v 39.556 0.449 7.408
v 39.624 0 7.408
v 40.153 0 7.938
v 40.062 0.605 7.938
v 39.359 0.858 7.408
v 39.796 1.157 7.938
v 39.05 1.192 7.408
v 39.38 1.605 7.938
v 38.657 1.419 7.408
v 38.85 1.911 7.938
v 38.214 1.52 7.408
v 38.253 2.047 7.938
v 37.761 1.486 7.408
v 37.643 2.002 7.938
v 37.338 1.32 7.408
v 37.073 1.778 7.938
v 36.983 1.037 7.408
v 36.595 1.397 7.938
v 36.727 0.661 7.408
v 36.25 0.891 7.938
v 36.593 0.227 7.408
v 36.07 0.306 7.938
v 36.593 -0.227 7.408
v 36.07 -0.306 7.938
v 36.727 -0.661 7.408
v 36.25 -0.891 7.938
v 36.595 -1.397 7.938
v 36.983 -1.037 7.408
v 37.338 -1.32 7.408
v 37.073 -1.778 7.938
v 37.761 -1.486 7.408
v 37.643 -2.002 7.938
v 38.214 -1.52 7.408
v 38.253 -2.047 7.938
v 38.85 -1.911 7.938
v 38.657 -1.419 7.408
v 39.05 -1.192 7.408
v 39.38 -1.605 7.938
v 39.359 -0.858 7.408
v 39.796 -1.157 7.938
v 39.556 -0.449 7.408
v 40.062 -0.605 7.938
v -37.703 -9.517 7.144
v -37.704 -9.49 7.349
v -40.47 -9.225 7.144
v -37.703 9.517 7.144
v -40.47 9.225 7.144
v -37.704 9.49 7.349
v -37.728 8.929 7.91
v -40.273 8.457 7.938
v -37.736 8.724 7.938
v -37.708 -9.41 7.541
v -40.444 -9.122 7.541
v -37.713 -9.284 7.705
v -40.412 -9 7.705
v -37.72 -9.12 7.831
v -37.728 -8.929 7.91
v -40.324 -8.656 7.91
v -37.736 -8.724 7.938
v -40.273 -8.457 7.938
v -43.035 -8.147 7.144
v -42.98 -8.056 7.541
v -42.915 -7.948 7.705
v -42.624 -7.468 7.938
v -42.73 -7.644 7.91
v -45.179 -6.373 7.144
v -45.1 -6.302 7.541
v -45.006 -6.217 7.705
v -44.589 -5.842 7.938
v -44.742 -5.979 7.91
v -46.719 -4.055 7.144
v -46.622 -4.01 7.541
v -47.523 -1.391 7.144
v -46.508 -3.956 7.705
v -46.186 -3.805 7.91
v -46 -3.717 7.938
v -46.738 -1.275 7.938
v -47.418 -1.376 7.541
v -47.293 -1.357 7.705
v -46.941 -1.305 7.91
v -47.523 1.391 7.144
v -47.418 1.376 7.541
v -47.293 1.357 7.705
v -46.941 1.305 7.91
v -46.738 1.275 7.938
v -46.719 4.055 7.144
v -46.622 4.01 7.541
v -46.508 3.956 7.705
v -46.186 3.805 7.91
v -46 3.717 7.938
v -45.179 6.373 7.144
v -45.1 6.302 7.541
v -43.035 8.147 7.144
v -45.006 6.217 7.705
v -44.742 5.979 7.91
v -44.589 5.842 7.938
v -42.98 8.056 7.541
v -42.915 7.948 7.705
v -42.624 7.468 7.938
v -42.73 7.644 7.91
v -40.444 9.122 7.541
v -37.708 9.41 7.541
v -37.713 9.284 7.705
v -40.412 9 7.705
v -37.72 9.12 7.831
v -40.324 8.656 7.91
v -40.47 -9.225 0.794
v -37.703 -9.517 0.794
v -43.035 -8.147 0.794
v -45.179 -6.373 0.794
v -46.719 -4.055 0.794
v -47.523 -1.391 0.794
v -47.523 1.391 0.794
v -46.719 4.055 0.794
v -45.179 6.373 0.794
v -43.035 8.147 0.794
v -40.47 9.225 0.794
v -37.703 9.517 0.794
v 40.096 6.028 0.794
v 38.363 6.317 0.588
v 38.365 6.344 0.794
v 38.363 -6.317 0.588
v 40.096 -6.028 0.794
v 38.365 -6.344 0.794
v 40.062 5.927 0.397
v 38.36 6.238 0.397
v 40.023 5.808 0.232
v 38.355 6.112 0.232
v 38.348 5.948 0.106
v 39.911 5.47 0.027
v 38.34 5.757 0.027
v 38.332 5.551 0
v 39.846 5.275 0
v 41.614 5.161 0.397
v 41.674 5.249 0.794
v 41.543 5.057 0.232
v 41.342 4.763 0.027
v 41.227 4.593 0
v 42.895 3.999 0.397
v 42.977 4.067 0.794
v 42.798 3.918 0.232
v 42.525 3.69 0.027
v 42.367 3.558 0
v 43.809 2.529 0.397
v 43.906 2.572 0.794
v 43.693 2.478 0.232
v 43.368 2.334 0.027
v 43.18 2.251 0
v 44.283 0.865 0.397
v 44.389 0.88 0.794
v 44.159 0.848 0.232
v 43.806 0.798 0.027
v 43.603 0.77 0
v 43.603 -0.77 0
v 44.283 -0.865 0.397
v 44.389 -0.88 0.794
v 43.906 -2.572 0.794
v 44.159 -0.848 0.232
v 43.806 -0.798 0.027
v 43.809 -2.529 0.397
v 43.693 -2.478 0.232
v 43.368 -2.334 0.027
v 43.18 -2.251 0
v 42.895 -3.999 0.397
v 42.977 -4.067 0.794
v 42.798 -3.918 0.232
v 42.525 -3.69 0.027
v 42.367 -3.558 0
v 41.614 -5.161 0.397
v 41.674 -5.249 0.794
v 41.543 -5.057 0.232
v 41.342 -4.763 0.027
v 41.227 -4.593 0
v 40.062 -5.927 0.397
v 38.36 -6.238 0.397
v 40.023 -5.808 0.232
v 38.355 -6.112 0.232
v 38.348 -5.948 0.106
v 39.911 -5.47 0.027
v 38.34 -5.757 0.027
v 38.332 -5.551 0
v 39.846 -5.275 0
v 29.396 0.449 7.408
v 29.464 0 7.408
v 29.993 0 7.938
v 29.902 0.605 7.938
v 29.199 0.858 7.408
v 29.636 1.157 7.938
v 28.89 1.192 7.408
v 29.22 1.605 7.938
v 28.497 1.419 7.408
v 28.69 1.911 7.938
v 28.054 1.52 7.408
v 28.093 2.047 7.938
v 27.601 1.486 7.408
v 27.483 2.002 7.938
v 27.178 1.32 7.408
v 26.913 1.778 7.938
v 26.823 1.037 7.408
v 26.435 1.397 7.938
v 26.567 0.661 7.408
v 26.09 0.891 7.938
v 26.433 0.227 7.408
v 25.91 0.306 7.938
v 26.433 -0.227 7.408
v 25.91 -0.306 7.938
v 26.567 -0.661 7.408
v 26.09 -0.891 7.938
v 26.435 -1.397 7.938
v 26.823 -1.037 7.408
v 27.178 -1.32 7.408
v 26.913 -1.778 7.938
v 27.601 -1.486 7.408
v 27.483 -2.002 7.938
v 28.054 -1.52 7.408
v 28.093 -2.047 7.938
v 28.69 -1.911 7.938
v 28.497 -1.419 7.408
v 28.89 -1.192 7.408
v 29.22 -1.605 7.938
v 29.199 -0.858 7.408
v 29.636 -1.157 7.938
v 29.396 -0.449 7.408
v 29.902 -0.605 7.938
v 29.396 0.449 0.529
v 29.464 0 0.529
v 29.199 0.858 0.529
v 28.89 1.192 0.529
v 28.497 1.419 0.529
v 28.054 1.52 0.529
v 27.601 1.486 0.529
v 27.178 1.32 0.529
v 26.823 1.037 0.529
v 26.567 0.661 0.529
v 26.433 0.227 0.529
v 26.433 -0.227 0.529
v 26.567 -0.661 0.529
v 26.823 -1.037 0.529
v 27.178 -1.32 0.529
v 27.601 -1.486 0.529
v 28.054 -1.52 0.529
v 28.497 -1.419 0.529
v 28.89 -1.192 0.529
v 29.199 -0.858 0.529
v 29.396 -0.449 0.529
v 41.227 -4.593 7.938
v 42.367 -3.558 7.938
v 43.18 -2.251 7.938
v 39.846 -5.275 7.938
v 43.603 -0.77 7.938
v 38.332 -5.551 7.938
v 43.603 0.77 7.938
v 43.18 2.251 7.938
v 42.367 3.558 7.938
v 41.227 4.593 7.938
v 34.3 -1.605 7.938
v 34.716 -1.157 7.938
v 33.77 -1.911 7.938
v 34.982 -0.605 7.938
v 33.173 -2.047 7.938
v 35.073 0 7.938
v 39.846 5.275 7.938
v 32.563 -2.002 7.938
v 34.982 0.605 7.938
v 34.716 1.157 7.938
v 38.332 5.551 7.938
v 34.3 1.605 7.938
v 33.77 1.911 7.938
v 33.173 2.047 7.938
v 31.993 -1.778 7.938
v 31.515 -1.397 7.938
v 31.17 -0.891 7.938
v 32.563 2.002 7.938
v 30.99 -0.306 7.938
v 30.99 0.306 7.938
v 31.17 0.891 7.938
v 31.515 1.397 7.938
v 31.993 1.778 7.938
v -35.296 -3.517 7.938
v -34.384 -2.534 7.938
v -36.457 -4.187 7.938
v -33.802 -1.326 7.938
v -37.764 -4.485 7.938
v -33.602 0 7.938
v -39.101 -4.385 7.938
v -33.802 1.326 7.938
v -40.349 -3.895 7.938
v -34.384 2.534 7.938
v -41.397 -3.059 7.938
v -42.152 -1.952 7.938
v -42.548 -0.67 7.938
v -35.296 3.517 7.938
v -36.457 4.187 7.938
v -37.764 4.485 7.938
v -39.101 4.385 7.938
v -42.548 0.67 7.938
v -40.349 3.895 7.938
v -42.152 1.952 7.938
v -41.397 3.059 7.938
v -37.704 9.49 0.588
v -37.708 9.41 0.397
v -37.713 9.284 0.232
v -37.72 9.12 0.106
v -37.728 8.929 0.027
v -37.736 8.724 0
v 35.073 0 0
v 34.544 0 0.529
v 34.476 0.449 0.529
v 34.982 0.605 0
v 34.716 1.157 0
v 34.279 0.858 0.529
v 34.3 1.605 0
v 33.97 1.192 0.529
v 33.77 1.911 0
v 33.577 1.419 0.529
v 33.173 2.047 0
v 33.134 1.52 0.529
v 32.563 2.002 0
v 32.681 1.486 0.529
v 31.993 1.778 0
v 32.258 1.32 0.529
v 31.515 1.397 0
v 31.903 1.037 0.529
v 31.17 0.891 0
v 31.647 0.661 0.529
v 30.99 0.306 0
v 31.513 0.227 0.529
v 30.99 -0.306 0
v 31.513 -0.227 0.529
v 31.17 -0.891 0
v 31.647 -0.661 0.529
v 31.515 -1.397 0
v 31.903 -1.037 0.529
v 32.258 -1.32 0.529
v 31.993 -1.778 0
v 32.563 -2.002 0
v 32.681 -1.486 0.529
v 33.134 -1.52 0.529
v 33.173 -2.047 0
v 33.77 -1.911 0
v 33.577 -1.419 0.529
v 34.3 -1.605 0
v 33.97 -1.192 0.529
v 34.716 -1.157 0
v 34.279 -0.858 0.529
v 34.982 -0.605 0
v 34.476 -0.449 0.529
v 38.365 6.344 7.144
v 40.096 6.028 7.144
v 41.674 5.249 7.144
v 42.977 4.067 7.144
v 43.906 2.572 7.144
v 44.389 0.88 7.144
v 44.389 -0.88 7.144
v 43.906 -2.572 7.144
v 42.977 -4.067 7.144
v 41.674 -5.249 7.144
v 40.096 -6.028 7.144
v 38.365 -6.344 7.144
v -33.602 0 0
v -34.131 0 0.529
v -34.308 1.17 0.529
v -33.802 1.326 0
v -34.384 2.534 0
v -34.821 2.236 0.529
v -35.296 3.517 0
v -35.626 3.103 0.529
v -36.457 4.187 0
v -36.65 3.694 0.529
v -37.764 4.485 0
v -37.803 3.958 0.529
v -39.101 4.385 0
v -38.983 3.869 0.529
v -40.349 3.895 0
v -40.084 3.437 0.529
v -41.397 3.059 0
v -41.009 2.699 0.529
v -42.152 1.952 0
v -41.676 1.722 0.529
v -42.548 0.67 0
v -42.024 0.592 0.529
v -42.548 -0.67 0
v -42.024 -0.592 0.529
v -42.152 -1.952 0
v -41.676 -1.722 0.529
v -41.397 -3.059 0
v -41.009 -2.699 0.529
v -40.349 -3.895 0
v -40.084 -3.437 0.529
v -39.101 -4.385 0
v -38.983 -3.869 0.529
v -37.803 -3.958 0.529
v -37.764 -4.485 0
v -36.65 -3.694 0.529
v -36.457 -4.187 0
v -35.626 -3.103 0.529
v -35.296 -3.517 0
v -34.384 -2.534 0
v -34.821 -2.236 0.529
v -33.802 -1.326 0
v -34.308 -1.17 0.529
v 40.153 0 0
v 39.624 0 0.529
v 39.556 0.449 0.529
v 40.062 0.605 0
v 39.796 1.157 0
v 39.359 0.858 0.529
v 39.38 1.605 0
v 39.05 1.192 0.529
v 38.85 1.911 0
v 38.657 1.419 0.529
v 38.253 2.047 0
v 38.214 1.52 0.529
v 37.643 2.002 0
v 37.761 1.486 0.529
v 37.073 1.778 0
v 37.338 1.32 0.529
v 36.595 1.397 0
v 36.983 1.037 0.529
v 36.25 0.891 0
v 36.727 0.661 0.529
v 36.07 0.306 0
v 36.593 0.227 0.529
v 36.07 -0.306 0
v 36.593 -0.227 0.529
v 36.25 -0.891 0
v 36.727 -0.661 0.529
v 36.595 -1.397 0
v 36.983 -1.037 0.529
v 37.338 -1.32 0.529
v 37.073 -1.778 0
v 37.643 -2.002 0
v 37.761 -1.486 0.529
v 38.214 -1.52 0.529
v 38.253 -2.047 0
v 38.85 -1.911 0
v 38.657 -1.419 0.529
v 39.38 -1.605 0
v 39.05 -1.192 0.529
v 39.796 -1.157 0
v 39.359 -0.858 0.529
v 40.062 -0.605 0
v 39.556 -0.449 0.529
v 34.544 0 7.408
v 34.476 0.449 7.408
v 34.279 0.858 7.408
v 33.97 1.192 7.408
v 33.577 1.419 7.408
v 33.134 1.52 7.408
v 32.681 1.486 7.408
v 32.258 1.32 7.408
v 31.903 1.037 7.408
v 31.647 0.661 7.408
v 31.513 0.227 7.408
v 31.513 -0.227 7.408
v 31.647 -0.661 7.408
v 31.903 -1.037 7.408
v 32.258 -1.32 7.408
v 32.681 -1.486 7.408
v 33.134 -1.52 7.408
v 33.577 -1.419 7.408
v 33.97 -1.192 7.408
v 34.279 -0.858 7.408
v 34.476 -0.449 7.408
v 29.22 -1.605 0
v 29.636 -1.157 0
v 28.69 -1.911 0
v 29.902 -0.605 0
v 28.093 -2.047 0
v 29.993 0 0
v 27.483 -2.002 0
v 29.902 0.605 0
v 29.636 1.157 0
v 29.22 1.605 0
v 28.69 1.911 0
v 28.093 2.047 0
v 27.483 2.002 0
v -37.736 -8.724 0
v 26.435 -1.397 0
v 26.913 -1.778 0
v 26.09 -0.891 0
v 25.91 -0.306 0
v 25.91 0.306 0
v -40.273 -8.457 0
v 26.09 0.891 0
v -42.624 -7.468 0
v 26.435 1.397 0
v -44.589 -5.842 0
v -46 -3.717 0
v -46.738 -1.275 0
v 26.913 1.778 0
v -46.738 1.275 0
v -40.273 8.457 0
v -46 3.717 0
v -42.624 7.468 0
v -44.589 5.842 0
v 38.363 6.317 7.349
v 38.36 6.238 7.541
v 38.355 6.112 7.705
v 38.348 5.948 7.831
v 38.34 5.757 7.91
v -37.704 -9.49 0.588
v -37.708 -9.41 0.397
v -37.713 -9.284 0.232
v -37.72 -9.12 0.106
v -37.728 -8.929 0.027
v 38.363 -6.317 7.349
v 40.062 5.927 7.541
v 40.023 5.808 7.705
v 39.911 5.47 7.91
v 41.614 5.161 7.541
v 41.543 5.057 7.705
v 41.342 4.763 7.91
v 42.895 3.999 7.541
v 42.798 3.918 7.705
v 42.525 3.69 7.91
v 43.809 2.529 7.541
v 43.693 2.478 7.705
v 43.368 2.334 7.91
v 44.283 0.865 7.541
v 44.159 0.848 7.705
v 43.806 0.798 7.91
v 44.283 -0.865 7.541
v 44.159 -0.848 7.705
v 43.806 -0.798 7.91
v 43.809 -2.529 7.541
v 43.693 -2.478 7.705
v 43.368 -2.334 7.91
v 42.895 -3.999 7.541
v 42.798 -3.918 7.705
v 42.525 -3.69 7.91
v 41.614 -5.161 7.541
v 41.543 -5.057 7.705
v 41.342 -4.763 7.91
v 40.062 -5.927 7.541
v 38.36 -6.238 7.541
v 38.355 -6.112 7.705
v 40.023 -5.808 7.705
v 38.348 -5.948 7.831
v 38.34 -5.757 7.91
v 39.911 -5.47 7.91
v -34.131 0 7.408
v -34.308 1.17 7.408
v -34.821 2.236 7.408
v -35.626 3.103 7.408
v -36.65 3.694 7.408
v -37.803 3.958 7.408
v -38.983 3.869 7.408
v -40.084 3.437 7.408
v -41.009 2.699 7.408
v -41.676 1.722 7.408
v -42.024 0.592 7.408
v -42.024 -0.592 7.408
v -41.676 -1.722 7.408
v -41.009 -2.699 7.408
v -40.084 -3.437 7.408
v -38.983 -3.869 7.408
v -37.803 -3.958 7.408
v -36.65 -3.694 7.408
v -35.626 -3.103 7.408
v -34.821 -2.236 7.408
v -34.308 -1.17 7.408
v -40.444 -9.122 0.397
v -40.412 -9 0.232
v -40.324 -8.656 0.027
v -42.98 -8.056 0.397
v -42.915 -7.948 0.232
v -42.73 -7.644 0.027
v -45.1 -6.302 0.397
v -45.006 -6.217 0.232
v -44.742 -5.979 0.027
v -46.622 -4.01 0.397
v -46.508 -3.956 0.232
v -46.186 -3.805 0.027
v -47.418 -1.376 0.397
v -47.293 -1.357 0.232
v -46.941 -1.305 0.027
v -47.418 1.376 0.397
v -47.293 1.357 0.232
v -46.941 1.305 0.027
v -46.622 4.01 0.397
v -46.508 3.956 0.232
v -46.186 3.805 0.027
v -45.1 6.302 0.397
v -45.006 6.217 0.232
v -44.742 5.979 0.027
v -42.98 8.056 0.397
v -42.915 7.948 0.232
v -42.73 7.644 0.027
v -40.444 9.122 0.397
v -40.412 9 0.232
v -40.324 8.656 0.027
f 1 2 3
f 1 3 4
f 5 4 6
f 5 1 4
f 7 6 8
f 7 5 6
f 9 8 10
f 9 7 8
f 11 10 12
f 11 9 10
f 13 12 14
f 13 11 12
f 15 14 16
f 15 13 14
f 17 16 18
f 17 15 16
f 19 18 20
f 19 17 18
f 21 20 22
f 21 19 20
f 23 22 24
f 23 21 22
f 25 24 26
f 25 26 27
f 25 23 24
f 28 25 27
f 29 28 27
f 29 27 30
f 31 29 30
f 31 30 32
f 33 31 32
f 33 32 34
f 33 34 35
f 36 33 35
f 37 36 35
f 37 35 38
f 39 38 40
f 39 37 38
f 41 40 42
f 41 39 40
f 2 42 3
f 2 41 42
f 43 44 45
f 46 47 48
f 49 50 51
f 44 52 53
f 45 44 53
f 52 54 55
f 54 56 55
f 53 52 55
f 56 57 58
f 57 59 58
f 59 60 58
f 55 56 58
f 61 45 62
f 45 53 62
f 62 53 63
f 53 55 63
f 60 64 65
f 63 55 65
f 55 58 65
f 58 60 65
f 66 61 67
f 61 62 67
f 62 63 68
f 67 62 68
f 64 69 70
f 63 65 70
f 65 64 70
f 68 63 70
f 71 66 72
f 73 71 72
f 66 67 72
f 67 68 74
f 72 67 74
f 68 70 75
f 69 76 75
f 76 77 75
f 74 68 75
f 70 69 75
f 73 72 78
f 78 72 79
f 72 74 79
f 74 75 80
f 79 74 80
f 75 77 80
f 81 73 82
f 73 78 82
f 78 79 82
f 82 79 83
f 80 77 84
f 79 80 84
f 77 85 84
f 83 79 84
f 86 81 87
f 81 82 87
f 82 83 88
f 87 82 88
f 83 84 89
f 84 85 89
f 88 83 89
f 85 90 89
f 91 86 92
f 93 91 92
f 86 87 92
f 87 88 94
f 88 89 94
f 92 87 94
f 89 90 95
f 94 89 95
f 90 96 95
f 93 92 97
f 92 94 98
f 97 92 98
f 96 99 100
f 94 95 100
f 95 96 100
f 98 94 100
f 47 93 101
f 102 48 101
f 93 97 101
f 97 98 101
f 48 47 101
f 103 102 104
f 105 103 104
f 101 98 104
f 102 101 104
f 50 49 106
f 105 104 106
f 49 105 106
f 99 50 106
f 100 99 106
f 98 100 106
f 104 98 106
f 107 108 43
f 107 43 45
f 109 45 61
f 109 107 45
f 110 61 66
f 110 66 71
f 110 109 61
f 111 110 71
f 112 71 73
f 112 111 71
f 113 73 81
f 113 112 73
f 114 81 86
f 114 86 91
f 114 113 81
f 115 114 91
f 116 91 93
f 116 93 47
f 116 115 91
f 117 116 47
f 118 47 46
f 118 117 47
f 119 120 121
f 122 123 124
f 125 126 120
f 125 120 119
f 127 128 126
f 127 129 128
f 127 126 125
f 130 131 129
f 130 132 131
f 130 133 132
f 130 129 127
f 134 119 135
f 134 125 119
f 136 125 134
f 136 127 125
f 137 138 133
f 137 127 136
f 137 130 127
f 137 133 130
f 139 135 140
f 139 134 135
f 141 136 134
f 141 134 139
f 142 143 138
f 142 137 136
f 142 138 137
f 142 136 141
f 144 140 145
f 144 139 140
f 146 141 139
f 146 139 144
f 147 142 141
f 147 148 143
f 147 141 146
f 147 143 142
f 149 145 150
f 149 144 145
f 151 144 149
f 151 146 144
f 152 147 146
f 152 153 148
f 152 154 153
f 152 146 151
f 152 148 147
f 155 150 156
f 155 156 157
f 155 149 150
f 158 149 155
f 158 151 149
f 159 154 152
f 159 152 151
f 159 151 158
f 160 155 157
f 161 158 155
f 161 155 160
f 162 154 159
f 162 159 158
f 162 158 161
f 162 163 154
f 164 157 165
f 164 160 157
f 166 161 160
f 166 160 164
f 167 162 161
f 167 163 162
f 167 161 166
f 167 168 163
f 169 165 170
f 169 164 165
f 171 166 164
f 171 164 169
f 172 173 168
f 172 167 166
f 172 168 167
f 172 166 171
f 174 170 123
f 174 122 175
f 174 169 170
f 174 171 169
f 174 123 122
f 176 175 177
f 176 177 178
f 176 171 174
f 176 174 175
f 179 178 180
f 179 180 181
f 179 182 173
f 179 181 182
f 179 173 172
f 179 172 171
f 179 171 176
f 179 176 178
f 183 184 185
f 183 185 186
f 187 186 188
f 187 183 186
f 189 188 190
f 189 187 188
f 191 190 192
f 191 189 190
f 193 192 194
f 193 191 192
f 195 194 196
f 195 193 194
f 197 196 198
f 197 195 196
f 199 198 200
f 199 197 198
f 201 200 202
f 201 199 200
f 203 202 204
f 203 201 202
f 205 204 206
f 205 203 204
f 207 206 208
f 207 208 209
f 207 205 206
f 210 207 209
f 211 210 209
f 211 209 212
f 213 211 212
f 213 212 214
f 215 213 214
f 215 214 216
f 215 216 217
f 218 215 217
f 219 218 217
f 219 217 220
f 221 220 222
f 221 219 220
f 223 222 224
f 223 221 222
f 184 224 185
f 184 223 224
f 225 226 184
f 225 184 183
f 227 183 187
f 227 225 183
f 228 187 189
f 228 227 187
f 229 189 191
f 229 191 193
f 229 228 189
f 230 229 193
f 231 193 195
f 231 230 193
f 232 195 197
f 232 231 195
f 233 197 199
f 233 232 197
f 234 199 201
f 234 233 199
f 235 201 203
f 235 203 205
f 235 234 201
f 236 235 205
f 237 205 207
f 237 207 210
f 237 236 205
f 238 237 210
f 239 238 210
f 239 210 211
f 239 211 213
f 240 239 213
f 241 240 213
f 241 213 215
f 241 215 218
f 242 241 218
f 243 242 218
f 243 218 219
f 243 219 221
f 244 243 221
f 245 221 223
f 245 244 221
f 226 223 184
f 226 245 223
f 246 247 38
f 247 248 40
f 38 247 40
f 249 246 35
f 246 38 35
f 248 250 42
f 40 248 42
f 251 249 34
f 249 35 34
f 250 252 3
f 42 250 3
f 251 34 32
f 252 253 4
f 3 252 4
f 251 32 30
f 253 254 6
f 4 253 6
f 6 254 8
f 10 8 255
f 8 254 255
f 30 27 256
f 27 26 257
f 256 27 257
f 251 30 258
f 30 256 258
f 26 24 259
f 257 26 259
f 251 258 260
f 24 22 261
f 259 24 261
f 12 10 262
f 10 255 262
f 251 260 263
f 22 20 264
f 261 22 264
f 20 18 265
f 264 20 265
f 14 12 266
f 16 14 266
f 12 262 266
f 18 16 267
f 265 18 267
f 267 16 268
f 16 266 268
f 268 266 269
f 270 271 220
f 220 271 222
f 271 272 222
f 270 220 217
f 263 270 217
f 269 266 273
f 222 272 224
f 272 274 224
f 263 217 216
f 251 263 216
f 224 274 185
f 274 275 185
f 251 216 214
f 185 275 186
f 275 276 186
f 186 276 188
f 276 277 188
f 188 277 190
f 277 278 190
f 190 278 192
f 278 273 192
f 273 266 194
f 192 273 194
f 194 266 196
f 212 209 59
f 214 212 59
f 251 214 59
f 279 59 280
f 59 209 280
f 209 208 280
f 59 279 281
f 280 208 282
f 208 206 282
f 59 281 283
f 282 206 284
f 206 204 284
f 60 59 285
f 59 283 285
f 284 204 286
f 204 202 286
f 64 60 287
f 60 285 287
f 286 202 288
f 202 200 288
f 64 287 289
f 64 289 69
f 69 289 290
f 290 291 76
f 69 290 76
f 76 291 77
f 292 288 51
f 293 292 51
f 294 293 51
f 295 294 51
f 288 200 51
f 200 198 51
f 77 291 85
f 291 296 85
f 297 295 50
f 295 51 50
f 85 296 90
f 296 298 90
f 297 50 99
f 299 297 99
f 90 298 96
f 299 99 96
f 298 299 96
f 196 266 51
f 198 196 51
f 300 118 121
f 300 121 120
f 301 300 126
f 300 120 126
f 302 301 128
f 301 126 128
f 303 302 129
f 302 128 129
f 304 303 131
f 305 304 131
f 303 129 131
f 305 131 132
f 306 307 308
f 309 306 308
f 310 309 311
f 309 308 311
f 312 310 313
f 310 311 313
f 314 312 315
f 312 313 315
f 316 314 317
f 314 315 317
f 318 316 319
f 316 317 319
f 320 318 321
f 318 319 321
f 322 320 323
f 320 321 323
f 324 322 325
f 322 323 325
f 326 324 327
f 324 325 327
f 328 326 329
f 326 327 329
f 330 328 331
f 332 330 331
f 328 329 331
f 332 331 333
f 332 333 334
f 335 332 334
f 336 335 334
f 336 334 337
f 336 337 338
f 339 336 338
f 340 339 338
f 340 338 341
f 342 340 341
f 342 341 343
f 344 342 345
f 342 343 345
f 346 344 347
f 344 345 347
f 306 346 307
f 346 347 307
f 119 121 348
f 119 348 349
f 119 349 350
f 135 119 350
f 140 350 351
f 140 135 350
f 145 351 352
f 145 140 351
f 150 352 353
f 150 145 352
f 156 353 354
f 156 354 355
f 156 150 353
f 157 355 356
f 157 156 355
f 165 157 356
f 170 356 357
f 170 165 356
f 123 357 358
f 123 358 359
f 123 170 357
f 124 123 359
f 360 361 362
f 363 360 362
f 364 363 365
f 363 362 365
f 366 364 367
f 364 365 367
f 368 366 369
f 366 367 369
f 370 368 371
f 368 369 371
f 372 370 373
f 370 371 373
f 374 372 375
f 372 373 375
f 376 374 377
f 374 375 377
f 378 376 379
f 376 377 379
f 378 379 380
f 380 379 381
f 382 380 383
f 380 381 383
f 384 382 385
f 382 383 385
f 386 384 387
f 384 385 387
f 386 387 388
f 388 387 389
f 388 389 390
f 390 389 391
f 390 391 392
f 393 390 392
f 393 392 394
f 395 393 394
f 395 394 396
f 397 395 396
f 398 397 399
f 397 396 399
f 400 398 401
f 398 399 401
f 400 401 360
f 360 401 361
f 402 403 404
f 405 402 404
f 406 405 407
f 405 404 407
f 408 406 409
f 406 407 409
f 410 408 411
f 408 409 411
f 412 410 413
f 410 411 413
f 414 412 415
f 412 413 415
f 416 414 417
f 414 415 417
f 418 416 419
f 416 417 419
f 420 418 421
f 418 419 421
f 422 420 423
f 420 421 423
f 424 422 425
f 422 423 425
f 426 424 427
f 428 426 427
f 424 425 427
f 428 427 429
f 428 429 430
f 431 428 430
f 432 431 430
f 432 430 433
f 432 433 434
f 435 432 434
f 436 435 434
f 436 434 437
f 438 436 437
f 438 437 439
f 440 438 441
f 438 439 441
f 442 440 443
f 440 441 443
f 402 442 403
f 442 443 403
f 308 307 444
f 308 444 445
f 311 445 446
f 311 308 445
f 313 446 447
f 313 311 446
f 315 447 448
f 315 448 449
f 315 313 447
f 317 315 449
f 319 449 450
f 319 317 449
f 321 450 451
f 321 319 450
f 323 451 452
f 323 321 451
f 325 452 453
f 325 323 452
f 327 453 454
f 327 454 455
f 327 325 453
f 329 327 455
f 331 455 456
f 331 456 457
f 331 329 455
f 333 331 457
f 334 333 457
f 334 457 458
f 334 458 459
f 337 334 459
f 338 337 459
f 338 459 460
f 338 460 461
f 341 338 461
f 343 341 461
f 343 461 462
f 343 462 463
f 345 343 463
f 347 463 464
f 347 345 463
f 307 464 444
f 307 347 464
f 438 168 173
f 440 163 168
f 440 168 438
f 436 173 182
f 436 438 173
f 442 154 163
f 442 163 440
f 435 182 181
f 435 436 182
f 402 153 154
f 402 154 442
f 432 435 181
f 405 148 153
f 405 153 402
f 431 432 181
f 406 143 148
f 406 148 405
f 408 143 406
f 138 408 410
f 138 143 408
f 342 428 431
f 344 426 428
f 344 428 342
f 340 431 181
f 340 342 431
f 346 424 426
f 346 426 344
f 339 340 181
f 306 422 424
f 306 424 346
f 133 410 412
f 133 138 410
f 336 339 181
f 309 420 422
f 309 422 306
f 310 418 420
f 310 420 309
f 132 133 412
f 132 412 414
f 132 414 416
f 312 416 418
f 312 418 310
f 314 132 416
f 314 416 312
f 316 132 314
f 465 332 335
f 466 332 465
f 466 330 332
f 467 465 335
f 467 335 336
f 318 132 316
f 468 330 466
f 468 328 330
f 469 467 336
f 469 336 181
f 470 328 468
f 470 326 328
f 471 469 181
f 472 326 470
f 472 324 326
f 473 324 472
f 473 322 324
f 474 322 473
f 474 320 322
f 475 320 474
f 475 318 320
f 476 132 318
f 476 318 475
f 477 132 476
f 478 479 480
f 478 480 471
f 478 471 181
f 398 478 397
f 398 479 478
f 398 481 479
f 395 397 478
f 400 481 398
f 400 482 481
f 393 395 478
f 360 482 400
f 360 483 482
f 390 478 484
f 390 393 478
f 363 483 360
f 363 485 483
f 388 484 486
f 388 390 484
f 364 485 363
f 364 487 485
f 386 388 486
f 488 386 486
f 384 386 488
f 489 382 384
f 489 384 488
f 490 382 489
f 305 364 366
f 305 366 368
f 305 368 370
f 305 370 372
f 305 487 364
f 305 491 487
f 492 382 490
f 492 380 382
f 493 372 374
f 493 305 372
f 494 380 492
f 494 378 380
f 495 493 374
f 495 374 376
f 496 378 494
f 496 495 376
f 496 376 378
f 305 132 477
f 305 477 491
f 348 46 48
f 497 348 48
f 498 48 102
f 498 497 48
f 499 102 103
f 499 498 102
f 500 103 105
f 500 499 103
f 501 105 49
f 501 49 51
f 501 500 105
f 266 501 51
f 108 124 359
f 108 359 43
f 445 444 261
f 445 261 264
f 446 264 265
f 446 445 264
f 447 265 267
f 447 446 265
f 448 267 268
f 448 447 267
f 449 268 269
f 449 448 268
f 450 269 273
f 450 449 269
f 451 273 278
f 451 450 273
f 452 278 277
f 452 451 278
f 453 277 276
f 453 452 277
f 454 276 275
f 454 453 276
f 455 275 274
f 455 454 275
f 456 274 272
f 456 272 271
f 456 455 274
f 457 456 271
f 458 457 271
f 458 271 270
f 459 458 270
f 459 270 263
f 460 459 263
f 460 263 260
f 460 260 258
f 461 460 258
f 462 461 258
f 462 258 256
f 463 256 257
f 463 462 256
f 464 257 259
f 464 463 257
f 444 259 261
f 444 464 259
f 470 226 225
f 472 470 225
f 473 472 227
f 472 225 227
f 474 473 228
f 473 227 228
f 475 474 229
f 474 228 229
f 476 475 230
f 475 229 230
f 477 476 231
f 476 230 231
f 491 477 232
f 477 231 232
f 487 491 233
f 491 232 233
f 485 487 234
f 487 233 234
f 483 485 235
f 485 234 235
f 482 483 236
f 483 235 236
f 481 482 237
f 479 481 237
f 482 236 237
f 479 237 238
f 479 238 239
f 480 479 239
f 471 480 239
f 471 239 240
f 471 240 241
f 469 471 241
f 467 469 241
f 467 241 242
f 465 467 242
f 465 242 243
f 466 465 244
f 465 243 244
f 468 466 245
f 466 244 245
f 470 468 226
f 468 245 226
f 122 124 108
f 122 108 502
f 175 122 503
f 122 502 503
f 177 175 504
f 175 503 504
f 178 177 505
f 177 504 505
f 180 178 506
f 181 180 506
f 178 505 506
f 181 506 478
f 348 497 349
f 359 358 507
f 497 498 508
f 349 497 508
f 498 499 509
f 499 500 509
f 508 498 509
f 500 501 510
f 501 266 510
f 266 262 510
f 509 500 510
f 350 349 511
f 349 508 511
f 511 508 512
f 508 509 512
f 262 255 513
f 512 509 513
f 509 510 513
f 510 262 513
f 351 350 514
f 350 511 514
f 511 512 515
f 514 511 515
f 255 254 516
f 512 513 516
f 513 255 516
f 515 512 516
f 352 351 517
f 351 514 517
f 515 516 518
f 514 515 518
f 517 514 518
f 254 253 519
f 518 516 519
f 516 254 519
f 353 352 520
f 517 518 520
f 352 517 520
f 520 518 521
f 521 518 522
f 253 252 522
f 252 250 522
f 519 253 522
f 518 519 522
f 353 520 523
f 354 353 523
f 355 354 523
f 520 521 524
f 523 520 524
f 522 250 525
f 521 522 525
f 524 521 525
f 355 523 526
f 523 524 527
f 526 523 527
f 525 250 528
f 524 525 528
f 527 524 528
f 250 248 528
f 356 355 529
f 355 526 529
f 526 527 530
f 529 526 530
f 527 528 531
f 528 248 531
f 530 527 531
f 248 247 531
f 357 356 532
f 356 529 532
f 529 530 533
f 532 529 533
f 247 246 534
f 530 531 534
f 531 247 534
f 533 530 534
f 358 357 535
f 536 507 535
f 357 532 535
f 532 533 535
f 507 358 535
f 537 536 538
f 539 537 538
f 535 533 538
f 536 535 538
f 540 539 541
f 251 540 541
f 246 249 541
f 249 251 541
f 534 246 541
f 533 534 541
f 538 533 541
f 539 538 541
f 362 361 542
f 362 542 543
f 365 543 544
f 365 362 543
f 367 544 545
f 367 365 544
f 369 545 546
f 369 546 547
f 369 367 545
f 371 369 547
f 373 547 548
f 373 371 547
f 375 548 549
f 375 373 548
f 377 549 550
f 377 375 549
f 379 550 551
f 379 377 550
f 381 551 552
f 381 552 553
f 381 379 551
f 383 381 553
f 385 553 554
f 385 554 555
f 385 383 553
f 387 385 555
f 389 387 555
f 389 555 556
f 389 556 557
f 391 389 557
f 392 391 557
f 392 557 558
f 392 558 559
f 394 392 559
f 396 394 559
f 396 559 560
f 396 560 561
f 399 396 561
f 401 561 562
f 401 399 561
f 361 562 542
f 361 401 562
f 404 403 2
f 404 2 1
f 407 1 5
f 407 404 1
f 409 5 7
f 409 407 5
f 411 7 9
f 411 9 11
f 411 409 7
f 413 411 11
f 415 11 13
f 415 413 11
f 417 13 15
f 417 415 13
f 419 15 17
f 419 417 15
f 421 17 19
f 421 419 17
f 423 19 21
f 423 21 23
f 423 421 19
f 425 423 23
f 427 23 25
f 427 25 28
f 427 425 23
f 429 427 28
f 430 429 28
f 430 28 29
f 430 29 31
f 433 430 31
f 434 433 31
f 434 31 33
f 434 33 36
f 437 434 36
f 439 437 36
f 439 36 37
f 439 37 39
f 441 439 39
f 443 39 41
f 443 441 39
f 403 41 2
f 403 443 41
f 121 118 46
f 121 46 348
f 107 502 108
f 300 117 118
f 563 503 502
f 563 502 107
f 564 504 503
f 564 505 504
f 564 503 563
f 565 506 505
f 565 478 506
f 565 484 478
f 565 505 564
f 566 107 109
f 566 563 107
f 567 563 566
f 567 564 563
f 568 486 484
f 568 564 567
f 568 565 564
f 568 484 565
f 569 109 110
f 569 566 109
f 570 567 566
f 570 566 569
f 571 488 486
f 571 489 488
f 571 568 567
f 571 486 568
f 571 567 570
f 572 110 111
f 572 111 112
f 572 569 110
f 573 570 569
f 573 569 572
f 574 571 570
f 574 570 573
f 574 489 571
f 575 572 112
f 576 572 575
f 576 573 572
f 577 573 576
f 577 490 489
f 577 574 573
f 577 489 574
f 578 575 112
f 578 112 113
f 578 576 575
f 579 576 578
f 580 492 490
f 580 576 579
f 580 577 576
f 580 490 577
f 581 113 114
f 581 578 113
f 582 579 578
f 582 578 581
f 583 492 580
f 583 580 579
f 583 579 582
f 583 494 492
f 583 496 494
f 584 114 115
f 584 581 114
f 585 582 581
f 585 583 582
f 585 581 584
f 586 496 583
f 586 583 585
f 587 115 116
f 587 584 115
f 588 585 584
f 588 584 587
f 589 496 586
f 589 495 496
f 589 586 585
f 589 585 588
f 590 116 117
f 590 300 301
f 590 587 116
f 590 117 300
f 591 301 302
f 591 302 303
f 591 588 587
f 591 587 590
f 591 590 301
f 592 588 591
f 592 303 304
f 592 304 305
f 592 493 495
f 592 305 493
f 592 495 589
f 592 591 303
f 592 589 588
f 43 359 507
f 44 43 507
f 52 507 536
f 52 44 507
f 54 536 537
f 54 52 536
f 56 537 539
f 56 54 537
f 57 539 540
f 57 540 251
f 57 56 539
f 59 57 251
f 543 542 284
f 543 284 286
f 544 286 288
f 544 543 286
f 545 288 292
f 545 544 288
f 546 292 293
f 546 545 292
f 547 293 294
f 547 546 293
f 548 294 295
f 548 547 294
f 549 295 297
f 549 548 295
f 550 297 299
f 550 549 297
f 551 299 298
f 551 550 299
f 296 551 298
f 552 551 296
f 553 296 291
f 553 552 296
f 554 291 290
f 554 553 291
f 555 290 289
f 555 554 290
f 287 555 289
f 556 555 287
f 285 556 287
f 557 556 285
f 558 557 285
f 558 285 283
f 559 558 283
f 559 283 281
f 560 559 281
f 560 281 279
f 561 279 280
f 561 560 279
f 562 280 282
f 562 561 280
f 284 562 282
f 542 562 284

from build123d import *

# Parameters (mm, degrees)
SKETCH1_R           = 3.96875
SKETCH1_R_2         = 1.524
BOSS_EXTRUDE1_DEPTH = 7.9375
FILLET2_R           = 0.79375
CHAMFER1_SIZE       = 0.529166667


with BuildPart() as part:
    # Sketch1 → Boss-Extrude1 (new body)
    with BuildSketch(Plane.XY):
        with BuildLine():
            Line((-37.703125, 9.516728179), (38.364583333, 6.344485453))
            ThreePointArc((38.364583333, 6.344485453), (44.45, 0), (38.364583333, -6.344485453))
            Line((38.364583333, -6.344485453), (-37.703125, -9.516728179))
            ThreePointArc((-37.703125, -9.516728179), (-47.625, 0), (-37.703125, 9.516728179))
        make_face()
        with Locations((-38.1, 0)):
            Circle(SKETCH1_R, mode=Mode.SUBTRACT)
        with Locations((38.1, 0)):
            Circle(SKETCH1_R_2, mode=Mode.SUBTRACT)
        with Locations((33.02, 0)):
            Circle(SKETCH1_R_2, mode=Mode.SUBTRACT)
        with Locations((27.94, 0)):
            Circle(SKETCH1_R_2, mode=Mode.SUBTRACT)
    extrude(amount=BOSS_EXTRUDE1_DEPTH)

    # Fillet2
    fillet2_edges = [part.edges().sort_by_distance(p)[0] for p in [
        (44.45, 0, 7.9375),
        (0.330729167, 7.930606816, 7.9375),
        (-47.625, 0, 7.9375),
        (0.330729167, 7.930606816, 0),
        (44.45, 0, 0),
        (0.330729167, -7.930606816, 0),
        (-47.625, 0, 0),
        (0.330729167, -7.930606816, 7.9375),
    ]]
    fillet(fillet2_edges, radius=FILLET2_R)

    # Chamfer1
    chamfer1_edges = [part.edges().sort_by_distance(p)[0] for p in [
        (-42.06875, 0, 0),
        (-42.06875, 0, 7.9375),
        (36.576, 0, 0),
        (36.576, 0, 7.9375),
        (31.496, 0, 0),
        (31.496, 0, 7.9375),
        (26.416, 0, 0),
        (26.416, 0, 7.9375),
    ]]
    chamfer(chamfer1_edges, length=CHAMFER1_SIZE)


solid = part.part
